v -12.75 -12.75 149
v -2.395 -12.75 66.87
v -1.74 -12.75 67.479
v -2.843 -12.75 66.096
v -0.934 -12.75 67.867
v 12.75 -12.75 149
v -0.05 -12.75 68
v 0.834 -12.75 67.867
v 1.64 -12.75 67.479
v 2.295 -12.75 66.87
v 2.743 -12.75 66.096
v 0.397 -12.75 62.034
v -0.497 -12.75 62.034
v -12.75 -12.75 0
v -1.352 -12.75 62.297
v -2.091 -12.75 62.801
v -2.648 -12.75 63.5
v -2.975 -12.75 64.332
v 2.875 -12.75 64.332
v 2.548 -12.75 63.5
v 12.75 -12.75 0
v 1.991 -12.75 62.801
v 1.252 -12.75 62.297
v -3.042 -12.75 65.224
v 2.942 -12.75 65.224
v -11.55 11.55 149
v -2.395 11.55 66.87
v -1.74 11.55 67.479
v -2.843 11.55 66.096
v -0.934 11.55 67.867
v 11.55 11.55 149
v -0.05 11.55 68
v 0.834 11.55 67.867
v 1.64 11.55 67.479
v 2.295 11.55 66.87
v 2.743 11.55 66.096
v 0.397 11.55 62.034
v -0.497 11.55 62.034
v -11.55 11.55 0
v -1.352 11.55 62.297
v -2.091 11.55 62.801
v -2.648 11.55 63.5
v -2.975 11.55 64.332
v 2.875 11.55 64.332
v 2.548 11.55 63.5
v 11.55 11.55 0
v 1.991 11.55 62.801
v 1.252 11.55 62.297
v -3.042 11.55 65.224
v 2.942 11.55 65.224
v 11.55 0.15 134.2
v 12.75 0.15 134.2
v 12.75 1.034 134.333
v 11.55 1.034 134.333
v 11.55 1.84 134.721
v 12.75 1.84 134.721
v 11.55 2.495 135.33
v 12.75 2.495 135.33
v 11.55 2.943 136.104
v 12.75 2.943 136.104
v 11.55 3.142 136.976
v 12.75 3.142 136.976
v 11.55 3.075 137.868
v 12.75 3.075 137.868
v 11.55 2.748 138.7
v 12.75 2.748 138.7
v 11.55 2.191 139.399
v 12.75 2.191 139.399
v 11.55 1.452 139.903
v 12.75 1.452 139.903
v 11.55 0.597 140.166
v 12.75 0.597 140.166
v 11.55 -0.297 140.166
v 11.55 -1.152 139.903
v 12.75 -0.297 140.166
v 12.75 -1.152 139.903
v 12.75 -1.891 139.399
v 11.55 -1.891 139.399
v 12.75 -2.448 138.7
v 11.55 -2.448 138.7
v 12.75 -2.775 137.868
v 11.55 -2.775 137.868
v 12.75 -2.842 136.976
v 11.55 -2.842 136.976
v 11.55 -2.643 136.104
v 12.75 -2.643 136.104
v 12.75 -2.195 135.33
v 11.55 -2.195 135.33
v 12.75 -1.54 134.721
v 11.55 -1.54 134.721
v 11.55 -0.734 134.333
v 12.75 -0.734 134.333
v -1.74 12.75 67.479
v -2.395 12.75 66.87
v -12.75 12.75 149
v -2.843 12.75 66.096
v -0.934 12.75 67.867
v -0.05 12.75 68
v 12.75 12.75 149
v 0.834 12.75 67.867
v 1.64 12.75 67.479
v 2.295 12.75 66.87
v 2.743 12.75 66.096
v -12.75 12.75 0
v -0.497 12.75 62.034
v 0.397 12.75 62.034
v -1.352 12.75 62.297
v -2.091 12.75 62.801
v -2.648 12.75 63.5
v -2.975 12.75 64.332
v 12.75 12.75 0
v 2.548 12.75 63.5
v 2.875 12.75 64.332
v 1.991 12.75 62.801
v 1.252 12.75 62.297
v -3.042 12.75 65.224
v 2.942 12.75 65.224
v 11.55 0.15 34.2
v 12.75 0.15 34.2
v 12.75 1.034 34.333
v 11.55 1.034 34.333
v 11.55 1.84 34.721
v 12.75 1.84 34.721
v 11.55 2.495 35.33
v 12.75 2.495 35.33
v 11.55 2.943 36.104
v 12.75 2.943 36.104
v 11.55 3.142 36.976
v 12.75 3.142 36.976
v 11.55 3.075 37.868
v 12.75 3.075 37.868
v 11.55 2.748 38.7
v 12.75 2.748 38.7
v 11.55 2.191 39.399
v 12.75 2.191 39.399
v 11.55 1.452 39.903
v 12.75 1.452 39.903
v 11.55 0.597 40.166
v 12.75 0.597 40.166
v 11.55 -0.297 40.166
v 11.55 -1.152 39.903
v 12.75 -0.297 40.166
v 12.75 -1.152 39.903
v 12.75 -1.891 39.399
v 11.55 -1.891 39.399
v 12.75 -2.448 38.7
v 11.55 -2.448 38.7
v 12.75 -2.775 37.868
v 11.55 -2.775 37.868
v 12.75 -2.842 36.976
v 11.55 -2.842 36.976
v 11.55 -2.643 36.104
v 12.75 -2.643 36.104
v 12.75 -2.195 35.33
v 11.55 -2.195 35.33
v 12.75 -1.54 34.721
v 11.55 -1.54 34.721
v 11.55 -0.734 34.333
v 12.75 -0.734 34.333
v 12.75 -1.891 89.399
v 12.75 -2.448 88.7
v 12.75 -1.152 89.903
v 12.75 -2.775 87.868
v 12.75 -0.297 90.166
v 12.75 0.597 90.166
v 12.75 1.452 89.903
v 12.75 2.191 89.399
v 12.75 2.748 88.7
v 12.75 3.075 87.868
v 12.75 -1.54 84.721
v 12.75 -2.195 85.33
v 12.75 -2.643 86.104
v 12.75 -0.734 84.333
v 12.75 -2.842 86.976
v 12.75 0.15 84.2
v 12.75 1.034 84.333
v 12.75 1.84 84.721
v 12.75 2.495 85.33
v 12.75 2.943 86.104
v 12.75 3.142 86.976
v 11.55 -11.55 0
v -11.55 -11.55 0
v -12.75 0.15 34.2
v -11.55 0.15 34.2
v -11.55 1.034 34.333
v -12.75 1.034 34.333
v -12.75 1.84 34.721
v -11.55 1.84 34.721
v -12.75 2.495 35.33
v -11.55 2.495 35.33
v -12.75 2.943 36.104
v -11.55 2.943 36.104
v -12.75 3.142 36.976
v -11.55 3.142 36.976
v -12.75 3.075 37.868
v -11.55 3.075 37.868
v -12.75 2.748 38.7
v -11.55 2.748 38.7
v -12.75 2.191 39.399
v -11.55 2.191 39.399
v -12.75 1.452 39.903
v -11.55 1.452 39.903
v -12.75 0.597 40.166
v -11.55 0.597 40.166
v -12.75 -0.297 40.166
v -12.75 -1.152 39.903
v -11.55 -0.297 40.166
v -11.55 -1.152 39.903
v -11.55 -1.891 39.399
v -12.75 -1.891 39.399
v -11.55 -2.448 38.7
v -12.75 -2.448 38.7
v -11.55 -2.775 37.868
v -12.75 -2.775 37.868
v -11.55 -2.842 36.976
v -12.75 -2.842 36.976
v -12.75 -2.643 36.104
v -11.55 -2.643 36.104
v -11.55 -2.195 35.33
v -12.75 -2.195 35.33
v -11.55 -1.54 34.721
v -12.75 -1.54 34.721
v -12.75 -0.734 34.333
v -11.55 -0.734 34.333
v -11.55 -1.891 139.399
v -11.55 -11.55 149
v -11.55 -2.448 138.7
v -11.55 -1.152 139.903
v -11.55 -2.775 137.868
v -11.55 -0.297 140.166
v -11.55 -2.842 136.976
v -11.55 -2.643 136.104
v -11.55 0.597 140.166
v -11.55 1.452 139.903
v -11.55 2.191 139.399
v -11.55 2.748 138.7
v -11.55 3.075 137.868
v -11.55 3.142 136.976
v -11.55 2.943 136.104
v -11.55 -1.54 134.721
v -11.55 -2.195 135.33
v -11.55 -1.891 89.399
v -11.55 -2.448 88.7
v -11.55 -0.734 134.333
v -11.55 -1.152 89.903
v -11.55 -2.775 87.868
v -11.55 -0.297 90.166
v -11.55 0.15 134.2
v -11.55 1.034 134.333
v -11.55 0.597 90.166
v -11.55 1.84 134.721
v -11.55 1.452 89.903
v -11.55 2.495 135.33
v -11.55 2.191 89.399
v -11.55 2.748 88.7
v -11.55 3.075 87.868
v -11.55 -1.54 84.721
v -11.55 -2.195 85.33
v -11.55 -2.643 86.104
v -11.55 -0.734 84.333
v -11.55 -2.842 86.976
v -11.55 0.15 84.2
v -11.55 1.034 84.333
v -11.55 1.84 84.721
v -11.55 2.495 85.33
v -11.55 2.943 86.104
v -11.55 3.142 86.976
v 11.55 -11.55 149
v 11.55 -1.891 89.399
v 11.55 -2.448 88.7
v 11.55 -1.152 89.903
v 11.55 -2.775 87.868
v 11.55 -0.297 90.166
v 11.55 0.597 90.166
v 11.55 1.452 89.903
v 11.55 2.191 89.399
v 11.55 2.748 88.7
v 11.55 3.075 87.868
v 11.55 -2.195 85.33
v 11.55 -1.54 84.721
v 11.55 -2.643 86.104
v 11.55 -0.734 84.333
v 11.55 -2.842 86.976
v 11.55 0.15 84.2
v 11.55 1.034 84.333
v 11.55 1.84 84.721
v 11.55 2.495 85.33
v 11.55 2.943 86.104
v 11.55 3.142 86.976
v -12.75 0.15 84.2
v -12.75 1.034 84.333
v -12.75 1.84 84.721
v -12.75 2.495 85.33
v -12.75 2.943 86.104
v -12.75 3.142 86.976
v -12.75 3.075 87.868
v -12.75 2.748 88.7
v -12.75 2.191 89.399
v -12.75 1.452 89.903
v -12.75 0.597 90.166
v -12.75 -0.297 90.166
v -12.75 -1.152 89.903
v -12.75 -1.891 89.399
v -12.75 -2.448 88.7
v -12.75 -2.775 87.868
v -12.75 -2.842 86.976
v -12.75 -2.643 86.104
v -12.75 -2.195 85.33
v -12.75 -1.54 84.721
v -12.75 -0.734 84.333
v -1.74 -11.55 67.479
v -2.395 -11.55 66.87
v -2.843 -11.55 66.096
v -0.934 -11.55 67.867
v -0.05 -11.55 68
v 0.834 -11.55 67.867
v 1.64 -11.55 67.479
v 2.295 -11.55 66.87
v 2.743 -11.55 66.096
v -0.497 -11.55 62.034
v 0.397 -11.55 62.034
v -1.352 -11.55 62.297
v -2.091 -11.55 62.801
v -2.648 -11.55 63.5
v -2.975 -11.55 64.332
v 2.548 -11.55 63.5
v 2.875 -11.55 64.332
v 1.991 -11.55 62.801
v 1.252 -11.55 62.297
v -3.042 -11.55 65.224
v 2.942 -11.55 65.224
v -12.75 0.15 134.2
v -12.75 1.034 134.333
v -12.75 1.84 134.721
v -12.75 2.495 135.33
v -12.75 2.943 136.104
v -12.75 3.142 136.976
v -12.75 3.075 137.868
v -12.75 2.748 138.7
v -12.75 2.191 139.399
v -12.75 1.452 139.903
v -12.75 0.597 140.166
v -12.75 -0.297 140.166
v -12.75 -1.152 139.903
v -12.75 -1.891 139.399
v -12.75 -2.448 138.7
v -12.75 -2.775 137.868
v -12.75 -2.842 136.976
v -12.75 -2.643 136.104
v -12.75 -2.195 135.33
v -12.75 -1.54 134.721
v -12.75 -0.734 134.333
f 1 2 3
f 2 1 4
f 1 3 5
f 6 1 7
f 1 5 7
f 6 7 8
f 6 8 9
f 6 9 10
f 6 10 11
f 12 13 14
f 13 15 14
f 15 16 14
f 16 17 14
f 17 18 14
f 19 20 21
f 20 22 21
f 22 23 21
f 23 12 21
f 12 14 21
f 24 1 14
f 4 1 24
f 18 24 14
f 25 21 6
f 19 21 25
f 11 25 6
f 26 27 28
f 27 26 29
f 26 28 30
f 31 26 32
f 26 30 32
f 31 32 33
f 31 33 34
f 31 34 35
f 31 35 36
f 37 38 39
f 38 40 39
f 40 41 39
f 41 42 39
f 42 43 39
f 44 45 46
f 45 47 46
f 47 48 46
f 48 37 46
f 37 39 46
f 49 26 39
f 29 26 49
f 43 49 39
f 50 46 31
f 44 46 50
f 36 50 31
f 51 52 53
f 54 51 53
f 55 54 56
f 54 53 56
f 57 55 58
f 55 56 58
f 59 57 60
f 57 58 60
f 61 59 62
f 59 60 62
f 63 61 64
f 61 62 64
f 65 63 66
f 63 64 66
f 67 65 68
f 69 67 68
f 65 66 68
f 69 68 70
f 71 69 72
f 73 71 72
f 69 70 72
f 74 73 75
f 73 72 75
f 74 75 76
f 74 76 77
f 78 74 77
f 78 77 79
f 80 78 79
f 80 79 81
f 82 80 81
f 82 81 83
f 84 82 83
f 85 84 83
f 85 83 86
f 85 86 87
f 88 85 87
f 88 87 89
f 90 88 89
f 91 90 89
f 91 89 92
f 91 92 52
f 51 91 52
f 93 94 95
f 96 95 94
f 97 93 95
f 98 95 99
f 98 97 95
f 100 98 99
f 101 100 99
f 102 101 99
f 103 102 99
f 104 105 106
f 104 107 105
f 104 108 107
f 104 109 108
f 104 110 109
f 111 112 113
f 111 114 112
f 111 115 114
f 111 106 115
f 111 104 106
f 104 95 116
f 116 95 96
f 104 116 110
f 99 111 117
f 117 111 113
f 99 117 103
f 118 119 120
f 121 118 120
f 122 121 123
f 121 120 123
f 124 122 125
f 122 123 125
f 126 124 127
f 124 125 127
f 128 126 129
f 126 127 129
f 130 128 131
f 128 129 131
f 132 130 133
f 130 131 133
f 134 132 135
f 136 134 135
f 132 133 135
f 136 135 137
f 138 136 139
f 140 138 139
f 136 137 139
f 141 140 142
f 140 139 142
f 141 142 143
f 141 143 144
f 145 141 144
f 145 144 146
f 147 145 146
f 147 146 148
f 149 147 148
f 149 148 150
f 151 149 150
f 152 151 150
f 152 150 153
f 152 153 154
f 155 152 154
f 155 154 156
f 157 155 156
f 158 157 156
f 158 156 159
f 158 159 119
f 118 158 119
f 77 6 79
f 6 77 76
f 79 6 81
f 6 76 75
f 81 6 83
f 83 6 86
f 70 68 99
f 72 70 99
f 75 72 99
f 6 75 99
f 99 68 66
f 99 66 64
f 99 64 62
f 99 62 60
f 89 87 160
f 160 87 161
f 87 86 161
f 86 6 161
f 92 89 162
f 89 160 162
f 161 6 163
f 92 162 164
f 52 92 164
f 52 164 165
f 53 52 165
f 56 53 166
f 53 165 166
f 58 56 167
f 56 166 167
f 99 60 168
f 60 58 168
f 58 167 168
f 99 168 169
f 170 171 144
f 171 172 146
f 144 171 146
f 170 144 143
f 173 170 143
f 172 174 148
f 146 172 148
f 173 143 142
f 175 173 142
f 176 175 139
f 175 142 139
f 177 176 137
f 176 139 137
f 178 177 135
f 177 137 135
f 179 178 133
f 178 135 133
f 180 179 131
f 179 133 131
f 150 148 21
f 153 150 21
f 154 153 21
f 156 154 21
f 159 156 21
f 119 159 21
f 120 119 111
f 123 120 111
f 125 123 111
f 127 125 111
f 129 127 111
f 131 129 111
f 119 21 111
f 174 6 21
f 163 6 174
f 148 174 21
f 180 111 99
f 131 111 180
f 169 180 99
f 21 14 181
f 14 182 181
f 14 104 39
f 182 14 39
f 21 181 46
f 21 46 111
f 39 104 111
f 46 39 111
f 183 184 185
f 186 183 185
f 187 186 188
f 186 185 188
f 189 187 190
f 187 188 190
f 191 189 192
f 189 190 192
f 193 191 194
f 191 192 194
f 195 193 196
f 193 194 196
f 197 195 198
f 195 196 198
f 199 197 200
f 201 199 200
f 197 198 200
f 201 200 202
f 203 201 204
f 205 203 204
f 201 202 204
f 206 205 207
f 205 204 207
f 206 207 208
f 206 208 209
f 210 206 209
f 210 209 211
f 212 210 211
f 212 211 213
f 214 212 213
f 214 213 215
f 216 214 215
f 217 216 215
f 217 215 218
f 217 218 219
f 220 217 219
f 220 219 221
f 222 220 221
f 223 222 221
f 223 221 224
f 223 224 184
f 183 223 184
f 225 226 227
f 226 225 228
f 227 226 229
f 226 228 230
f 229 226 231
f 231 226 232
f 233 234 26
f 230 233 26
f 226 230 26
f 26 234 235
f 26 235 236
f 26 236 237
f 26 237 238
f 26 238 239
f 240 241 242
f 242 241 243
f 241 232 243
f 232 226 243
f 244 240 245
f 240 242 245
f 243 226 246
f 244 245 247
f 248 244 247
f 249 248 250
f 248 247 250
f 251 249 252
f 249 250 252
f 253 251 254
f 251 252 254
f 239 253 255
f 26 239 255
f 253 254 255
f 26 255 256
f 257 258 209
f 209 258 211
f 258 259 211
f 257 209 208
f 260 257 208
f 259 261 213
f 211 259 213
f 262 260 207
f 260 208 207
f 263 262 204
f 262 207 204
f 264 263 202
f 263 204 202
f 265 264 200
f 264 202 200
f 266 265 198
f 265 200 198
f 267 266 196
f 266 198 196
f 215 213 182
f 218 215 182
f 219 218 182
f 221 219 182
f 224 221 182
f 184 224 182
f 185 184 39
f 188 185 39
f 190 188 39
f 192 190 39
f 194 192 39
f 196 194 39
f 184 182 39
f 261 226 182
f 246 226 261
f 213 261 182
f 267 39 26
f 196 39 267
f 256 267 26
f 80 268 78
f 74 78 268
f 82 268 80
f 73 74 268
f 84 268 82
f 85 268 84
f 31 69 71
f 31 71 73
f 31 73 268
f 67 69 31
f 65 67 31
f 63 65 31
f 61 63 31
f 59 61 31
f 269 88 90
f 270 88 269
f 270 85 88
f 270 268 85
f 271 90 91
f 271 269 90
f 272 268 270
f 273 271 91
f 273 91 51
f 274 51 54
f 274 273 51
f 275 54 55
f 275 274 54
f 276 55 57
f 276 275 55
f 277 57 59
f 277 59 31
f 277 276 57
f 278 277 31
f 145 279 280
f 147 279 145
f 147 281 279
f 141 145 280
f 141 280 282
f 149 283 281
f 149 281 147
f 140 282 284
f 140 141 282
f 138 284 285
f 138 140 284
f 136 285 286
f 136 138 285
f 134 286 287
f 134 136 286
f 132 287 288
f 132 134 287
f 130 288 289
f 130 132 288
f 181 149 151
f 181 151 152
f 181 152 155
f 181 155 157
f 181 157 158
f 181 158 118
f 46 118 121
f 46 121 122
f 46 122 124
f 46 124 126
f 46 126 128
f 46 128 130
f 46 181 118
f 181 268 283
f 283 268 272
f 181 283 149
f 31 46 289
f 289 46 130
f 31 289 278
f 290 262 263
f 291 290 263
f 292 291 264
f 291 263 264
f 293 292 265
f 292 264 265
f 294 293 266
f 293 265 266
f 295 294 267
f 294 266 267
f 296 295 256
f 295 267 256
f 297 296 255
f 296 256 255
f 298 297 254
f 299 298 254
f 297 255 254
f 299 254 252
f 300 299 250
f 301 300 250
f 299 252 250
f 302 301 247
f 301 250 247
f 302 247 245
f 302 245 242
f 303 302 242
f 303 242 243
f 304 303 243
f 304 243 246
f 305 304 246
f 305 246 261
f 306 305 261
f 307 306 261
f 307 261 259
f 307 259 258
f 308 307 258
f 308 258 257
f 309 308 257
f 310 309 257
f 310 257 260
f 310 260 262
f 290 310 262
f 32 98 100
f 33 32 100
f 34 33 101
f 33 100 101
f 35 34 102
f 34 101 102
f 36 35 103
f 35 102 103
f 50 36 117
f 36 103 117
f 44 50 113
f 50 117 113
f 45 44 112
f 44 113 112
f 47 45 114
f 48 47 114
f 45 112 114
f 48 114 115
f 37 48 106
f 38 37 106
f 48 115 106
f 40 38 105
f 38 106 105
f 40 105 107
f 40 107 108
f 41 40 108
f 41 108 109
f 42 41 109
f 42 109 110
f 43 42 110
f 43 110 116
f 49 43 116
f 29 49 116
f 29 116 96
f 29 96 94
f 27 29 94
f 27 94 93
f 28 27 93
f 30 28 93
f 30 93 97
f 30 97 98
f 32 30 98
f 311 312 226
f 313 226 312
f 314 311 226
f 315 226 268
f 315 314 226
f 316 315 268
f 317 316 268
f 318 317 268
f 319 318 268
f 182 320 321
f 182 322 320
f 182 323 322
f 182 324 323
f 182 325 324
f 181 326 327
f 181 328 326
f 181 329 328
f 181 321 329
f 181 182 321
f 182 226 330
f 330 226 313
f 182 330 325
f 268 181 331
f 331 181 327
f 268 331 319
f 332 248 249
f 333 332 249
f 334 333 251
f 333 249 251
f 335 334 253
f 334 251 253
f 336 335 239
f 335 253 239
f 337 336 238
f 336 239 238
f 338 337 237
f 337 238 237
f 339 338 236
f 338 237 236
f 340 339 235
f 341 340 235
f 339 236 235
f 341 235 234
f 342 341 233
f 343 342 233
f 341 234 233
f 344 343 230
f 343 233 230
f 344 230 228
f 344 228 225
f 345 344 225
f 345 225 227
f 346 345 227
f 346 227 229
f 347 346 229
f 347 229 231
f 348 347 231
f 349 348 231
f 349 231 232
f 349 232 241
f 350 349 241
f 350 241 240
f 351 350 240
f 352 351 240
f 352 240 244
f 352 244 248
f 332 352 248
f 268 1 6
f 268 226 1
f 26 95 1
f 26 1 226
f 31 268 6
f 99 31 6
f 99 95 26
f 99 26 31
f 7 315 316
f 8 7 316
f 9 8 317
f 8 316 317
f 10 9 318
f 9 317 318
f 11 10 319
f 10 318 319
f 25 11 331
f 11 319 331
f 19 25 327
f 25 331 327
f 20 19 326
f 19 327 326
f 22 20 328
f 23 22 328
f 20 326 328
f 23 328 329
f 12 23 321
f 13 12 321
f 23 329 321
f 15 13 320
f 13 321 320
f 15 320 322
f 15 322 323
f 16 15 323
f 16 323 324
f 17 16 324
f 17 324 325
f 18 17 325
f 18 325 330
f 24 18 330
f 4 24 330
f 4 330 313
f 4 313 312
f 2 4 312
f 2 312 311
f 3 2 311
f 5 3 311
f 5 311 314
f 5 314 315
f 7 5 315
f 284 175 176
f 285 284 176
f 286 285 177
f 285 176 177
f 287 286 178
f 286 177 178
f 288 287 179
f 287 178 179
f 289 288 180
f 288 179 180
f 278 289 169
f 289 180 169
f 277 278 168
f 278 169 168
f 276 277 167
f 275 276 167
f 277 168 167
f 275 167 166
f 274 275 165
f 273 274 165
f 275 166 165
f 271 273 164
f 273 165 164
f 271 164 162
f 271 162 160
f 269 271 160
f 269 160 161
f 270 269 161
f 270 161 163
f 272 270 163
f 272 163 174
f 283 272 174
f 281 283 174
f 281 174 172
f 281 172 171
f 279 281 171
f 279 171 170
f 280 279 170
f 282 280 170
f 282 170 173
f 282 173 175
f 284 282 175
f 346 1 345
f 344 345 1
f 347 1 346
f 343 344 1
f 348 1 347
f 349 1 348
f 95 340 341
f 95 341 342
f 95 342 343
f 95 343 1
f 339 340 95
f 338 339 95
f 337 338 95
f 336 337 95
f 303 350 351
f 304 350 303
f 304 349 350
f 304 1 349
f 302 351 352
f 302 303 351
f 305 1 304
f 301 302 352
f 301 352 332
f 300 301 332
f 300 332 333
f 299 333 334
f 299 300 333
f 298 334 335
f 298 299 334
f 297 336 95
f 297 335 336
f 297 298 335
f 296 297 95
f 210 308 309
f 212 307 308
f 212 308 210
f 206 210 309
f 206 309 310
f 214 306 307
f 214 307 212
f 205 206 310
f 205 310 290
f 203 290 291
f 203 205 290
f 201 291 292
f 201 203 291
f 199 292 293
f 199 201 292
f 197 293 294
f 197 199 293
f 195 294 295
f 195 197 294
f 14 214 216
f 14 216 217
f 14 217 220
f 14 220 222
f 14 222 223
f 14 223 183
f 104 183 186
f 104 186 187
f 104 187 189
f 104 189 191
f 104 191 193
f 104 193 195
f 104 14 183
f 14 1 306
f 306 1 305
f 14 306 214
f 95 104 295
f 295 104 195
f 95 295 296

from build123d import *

# Parameters (mm, degrees)
SKETCH1_W                = 25.5
SKETCH1_H                = 25.5
SKETCH1_W_2              = 23.1
SKETCH1_H_2              = 23.1
BOSS_EXTRUDE1_DEPTH      = 149
F_6_0_6_DIAMETER_HOLE5_D = 6
F_6_0_6_DIAMETER_HOLE7_D = 6


with BuildPart() as part:
    # Sketch1 → Boss-Extrude1 (new body)
    with BuildSketch(Plane.XY):
        Rectangle(SKETCH1_W, SKETCH1_H)
        Rectangle(SKETCH1_W_2, SKETCH1_H_2, mode=Mode.SUBTRACT)
    extrude(amount=BOSS_EXTRUDE1_DEPTH)

    # Ø6.0 (6) Diameter Hole5 (through all)
    with Locations(Plane(origin=(-0.05, -21.75, 65), x_dir=(0, 0, -1), z_dir=(0, -1, 0))):
        with Locations((0, 0)):
            Hole(F_6_0_6_DIAMETER_HOLE5_D / 2)

    # Ø6.0 (6) Diameter Hole7 (through all)
    with Locations(Plane.ZY.offset(12.75)):
        with Locations((37.2, 0.15), (87.2, 0.15), (137.2, 0.15)):
            Hole(F_6_0_6_DIAMETER_HOLE7_D / 2)


solid = part.part
